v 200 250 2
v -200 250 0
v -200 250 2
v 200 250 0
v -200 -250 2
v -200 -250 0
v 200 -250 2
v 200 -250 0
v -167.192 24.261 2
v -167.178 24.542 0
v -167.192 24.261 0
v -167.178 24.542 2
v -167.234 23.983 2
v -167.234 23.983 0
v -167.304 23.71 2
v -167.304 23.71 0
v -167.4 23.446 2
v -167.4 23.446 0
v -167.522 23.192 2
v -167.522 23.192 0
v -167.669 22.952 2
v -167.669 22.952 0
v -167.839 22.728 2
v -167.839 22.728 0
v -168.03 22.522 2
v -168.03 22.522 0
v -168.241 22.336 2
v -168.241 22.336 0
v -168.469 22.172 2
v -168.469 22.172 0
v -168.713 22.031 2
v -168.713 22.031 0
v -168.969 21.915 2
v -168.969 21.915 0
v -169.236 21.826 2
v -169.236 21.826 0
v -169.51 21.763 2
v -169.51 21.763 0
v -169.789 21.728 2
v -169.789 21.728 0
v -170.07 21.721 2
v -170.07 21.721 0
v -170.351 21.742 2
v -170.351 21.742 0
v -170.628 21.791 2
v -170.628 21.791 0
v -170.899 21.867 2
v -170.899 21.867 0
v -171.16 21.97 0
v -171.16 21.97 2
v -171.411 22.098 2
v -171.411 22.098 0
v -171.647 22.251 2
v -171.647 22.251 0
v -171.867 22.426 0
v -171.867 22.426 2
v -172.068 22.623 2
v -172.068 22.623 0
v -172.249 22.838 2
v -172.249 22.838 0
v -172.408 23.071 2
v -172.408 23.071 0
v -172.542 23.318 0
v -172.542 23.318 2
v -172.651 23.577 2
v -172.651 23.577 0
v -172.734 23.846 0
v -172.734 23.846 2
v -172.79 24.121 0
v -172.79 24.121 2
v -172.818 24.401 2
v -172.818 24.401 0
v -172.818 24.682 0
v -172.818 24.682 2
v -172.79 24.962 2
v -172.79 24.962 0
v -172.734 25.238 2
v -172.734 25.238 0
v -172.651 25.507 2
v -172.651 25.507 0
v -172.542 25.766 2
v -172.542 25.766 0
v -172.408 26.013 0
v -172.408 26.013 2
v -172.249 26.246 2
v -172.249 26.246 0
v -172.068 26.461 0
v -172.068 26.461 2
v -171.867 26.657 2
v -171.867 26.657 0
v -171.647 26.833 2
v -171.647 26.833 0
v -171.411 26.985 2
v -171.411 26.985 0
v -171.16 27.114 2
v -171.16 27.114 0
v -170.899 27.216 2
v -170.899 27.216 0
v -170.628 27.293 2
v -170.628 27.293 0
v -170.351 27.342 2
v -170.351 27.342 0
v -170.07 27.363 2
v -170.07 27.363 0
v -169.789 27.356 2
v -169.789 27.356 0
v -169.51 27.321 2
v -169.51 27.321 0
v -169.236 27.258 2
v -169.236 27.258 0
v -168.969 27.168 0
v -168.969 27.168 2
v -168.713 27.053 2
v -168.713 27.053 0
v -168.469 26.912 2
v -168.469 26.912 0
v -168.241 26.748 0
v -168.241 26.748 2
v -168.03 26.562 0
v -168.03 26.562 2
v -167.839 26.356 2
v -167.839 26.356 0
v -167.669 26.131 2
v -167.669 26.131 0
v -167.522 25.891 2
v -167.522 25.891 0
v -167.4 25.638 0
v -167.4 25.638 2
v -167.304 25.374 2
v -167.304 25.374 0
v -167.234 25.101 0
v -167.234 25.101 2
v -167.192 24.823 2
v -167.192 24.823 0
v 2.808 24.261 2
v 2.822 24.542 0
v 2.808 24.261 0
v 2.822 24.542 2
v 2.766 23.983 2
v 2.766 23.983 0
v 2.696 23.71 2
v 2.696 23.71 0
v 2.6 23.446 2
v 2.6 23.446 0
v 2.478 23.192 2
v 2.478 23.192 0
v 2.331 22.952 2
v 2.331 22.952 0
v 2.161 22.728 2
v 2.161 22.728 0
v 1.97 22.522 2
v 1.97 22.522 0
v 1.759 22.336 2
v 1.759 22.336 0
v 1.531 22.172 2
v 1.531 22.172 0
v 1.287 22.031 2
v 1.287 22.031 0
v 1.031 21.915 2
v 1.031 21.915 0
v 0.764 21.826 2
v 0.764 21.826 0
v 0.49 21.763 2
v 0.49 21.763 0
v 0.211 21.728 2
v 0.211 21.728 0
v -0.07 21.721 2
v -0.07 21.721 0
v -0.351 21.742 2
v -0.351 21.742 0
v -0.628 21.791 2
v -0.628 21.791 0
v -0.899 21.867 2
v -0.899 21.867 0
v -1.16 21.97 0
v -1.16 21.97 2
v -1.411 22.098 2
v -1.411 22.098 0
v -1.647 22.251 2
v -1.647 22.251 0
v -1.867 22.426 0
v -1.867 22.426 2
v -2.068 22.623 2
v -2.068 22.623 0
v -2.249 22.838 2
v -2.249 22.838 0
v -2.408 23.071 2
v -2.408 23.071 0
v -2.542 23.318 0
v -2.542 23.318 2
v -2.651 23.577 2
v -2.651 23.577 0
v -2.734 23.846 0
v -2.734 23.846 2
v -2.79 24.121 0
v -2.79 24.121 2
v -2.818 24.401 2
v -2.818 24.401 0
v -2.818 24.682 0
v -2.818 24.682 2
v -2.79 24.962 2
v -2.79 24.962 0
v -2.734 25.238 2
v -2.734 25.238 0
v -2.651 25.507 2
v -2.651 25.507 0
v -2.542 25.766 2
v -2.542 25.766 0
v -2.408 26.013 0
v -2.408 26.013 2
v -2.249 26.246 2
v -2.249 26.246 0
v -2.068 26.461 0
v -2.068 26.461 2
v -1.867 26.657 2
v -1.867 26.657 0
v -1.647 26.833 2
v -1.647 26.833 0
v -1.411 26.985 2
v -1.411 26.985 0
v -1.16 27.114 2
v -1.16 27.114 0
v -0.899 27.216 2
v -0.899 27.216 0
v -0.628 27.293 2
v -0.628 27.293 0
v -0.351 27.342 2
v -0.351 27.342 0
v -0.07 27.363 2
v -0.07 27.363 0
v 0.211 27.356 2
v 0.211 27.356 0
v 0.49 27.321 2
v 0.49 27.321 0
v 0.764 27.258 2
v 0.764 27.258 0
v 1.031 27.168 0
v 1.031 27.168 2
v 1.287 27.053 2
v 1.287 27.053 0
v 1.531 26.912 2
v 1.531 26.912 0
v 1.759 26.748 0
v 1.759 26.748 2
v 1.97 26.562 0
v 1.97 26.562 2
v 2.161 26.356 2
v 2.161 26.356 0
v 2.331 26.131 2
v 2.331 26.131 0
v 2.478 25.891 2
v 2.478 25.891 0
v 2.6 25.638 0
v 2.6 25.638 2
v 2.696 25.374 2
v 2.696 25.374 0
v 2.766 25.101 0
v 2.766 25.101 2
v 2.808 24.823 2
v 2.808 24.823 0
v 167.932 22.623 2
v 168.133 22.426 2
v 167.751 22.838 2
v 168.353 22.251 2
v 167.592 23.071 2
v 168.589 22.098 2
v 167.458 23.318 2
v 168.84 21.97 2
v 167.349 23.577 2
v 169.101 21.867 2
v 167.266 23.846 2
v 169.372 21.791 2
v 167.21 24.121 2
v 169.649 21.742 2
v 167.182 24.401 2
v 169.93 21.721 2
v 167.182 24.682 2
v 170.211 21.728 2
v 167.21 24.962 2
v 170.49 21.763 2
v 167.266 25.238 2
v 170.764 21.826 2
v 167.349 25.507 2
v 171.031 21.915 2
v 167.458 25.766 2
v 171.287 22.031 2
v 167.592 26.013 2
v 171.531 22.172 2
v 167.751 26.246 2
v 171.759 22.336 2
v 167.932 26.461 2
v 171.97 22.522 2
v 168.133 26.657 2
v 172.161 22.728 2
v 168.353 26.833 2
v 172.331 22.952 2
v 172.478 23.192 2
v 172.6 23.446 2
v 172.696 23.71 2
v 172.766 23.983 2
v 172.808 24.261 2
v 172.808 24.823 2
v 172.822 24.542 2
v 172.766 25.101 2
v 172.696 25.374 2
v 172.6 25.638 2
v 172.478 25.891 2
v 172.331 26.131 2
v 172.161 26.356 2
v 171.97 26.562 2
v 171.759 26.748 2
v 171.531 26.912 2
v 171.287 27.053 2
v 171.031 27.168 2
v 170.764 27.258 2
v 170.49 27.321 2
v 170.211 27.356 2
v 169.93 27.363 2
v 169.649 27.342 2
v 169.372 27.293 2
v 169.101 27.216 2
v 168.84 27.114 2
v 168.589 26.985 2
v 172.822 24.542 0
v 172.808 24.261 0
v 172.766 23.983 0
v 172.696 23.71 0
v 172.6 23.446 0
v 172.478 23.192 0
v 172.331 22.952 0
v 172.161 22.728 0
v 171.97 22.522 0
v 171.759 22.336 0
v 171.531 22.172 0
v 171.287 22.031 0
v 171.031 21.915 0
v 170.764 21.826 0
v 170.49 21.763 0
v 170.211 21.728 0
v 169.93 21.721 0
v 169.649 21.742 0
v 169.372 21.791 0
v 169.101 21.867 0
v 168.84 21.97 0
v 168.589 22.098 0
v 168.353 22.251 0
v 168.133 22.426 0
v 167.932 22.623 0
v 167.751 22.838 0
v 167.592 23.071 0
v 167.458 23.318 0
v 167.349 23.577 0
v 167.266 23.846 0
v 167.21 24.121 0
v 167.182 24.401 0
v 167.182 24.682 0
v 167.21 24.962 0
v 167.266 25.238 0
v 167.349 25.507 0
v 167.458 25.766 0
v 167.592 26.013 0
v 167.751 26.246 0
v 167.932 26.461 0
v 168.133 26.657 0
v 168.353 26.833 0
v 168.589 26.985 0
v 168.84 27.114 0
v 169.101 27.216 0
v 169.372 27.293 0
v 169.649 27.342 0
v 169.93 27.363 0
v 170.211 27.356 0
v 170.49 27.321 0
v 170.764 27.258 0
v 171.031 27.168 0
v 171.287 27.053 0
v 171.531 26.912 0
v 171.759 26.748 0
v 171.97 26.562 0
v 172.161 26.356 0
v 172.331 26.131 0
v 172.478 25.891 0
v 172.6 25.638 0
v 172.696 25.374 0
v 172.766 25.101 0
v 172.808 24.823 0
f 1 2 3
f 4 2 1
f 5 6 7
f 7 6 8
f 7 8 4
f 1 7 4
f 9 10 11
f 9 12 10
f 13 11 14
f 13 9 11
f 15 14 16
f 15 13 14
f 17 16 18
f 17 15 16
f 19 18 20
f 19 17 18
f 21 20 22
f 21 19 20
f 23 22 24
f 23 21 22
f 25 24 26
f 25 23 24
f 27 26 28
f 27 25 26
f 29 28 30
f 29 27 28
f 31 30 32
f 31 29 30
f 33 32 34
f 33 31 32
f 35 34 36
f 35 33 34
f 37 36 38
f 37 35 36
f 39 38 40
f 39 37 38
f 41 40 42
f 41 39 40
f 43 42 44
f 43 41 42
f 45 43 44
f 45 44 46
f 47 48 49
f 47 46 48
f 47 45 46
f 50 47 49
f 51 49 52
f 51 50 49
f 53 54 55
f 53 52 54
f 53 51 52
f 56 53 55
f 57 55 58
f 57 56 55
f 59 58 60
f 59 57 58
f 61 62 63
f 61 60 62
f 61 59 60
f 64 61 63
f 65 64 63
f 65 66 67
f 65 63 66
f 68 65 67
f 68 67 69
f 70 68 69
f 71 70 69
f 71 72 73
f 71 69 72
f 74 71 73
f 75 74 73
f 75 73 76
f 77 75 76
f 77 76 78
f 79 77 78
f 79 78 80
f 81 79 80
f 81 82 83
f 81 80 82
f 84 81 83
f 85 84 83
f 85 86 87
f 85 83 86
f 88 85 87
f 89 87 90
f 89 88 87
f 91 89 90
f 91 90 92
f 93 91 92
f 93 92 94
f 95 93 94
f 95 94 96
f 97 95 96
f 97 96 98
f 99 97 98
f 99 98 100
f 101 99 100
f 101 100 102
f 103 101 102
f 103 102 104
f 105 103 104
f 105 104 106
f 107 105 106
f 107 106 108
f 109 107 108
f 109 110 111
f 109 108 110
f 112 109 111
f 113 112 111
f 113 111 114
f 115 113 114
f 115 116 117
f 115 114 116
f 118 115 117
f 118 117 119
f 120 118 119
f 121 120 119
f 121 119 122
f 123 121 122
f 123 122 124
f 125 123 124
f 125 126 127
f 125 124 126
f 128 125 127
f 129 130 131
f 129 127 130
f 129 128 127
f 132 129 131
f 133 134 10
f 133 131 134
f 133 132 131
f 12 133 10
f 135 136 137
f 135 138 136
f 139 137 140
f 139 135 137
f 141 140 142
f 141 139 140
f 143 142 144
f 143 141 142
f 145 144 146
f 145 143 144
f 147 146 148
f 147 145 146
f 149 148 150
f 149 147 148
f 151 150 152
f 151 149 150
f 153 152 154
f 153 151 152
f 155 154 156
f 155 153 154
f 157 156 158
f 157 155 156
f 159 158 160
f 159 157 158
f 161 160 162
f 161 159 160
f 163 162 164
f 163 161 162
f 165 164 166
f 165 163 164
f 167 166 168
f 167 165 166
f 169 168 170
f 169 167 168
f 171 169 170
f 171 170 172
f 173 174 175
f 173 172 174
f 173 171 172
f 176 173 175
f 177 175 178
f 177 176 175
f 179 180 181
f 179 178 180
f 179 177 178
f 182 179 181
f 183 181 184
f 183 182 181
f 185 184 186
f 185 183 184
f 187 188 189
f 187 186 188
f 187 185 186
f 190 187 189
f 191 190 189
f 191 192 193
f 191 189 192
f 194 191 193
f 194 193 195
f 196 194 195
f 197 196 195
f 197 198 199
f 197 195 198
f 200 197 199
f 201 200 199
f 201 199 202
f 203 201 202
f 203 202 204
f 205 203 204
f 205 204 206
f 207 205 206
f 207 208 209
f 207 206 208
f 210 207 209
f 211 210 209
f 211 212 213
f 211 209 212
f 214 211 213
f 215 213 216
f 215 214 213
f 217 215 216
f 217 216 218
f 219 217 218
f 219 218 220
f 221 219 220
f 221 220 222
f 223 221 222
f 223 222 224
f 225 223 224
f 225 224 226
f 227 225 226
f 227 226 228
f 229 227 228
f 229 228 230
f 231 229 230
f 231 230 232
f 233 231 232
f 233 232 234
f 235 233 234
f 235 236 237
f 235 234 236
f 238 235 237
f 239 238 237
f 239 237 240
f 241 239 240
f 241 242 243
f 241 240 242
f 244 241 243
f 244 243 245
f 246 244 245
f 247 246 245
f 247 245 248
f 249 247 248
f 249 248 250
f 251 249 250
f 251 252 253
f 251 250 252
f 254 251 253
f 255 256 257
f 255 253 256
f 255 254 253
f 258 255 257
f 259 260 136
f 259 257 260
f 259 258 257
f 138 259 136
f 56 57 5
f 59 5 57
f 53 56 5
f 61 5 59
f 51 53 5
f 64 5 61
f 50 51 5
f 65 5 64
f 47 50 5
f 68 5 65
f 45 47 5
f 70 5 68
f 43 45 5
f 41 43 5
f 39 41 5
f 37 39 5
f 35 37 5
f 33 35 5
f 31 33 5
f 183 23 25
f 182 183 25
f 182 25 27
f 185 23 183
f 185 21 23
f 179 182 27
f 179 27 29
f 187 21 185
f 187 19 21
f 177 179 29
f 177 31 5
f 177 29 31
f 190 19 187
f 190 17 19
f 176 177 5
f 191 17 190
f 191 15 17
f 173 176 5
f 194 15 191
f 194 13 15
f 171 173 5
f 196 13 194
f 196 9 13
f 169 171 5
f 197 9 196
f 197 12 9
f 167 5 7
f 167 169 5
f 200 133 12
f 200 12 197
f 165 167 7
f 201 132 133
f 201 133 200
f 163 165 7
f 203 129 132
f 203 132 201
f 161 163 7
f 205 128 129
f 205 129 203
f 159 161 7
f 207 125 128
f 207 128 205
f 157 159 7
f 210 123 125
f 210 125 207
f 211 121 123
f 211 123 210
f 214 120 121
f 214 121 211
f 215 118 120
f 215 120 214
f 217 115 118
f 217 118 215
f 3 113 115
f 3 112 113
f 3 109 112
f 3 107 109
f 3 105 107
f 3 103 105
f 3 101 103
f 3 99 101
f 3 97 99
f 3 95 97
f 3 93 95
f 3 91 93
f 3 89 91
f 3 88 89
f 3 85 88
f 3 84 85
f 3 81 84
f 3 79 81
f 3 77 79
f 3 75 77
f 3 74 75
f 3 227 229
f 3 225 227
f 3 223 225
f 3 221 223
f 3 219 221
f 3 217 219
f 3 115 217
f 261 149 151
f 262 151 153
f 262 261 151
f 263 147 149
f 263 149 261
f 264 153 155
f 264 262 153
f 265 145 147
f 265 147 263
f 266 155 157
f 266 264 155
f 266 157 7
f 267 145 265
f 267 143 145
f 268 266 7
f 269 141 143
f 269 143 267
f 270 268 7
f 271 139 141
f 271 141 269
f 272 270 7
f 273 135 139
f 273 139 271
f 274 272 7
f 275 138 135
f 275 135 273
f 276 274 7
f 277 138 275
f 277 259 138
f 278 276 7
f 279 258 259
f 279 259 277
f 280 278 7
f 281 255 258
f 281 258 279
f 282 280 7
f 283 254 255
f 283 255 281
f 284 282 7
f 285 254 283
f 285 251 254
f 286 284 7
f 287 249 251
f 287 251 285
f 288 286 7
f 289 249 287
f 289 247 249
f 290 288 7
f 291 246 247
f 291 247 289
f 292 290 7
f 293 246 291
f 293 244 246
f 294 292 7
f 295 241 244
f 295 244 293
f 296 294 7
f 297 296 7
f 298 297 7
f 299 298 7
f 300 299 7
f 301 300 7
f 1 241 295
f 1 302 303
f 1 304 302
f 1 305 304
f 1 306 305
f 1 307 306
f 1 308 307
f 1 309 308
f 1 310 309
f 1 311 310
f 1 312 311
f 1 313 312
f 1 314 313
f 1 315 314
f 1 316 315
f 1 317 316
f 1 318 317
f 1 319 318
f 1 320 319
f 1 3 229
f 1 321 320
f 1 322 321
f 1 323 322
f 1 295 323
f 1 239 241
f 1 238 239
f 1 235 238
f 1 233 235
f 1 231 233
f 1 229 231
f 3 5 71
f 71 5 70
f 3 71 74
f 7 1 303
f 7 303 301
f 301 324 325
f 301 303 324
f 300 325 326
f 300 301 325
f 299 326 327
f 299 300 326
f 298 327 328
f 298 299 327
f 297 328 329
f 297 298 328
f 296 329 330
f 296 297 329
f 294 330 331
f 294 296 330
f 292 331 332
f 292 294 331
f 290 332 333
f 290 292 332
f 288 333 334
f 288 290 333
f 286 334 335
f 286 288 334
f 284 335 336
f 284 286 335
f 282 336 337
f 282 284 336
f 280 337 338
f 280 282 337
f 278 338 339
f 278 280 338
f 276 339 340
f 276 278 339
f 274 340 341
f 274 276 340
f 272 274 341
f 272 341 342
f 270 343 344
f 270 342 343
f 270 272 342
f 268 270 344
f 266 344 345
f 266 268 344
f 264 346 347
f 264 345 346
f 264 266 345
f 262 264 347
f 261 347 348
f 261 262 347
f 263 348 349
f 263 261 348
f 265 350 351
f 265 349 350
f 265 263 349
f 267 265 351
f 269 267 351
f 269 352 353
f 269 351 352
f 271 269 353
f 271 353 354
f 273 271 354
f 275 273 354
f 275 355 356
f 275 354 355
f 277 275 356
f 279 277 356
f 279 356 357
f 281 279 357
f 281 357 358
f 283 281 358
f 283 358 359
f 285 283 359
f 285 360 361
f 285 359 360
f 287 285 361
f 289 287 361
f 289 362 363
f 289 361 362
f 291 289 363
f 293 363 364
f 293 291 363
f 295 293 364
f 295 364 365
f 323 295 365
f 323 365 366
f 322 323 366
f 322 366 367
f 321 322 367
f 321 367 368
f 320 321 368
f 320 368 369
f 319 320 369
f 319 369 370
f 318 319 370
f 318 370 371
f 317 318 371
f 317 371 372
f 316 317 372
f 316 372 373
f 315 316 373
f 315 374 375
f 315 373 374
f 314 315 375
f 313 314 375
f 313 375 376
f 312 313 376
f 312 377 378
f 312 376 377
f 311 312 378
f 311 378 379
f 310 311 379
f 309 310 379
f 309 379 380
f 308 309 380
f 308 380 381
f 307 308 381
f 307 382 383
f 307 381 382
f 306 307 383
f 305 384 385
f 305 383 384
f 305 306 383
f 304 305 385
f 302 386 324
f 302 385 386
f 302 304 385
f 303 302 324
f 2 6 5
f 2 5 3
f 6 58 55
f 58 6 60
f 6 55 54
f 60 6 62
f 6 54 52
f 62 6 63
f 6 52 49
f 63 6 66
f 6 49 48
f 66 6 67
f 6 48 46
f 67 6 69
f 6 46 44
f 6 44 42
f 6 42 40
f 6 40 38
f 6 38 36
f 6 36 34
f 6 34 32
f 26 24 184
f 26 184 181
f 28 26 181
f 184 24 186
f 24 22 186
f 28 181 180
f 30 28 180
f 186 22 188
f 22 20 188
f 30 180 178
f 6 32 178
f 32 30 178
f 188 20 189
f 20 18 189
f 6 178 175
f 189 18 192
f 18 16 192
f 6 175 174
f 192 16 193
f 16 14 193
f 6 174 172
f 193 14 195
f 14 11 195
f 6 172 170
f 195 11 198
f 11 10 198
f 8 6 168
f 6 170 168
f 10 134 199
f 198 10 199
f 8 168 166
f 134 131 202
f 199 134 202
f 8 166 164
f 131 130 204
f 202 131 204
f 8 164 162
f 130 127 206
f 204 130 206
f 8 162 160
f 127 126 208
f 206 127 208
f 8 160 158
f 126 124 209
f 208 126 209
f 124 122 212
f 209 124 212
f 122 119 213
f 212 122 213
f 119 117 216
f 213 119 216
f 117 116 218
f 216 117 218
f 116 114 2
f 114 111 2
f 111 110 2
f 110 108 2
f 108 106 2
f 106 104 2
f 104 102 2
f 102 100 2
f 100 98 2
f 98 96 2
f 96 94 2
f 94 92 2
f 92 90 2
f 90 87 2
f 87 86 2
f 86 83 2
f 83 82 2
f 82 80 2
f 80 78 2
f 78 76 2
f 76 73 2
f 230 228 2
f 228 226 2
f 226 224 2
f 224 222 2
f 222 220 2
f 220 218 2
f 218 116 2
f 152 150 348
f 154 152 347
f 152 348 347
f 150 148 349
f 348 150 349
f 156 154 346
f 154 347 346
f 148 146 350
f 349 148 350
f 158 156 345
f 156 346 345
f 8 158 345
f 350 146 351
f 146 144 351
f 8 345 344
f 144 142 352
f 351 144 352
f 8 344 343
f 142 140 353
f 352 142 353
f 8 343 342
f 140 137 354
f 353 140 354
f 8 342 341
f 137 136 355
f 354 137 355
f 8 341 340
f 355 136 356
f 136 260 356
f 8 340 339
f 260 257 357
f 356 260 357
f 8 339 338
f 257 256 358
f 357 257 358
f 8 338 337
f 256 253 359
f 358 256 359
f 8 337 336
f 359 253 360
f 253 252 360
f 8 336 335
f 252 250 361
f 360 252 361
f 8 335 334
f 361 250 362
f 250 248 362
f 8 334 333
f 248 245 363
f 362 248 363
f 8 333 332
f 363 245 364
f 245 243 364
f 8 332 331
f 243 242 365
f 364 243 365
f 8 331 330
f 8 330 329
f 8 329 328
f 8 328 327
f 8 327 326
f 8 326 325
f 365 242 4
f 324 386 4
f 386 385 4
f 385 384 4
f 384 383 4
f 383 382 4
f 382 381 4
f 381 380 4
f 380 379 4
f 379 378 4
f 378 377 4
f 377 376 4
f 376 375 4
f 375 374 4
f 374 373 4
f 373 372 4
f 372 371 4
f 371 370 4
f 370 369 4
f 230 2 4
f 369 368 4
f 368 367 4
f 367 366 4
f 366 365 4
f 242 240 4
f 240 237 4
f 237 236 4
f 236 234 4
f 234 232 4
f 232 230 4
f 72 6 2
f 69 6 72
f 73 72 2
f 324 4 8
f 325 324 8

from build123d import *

# Parameters (mm, degrees)
SKETCH1_W           = 400
SKETCH1_H           = 500
BOSS_EXTRUDE1_DEPTH = 2
SKETCH3_R           = 2.821572875
CUT_EXTRUDE2_DEPTH  = 60


with BuildPart() as part:
    # Sketch1 → Boss-Extrude1 (new body)
    with BuildSketch(Plane.XY):
        Rectangle(SKETCH1_W, SKETCH1_H)
    extrude(amount=BOSS_EXTRUDE1_DEPTH)

    # Sketch3 → Cut-Extrude2 (cut)
    with BuildSketch(Plane(origin=(0, 7.541845926, 34), x_dir=(-1, 0, 0), z_dir=(0, 0, -1))):
        with Locations(Location((-170, 17, 0), (0, 0, 180))):
            Circle(SKETCH3_R)
        with Locations(Location((0, 17, 0), (0, 0, 180))):
            Circle(SKETCH3_R)
        with Locations(Location((170, 17, 0), (0, 0, 180))):
            Circle(SKETCH3_R)
    extrude(amount=CUT_EXTRUDE2_DEPTH, mode=Mode.SUBTRACT)


solid = part.part
